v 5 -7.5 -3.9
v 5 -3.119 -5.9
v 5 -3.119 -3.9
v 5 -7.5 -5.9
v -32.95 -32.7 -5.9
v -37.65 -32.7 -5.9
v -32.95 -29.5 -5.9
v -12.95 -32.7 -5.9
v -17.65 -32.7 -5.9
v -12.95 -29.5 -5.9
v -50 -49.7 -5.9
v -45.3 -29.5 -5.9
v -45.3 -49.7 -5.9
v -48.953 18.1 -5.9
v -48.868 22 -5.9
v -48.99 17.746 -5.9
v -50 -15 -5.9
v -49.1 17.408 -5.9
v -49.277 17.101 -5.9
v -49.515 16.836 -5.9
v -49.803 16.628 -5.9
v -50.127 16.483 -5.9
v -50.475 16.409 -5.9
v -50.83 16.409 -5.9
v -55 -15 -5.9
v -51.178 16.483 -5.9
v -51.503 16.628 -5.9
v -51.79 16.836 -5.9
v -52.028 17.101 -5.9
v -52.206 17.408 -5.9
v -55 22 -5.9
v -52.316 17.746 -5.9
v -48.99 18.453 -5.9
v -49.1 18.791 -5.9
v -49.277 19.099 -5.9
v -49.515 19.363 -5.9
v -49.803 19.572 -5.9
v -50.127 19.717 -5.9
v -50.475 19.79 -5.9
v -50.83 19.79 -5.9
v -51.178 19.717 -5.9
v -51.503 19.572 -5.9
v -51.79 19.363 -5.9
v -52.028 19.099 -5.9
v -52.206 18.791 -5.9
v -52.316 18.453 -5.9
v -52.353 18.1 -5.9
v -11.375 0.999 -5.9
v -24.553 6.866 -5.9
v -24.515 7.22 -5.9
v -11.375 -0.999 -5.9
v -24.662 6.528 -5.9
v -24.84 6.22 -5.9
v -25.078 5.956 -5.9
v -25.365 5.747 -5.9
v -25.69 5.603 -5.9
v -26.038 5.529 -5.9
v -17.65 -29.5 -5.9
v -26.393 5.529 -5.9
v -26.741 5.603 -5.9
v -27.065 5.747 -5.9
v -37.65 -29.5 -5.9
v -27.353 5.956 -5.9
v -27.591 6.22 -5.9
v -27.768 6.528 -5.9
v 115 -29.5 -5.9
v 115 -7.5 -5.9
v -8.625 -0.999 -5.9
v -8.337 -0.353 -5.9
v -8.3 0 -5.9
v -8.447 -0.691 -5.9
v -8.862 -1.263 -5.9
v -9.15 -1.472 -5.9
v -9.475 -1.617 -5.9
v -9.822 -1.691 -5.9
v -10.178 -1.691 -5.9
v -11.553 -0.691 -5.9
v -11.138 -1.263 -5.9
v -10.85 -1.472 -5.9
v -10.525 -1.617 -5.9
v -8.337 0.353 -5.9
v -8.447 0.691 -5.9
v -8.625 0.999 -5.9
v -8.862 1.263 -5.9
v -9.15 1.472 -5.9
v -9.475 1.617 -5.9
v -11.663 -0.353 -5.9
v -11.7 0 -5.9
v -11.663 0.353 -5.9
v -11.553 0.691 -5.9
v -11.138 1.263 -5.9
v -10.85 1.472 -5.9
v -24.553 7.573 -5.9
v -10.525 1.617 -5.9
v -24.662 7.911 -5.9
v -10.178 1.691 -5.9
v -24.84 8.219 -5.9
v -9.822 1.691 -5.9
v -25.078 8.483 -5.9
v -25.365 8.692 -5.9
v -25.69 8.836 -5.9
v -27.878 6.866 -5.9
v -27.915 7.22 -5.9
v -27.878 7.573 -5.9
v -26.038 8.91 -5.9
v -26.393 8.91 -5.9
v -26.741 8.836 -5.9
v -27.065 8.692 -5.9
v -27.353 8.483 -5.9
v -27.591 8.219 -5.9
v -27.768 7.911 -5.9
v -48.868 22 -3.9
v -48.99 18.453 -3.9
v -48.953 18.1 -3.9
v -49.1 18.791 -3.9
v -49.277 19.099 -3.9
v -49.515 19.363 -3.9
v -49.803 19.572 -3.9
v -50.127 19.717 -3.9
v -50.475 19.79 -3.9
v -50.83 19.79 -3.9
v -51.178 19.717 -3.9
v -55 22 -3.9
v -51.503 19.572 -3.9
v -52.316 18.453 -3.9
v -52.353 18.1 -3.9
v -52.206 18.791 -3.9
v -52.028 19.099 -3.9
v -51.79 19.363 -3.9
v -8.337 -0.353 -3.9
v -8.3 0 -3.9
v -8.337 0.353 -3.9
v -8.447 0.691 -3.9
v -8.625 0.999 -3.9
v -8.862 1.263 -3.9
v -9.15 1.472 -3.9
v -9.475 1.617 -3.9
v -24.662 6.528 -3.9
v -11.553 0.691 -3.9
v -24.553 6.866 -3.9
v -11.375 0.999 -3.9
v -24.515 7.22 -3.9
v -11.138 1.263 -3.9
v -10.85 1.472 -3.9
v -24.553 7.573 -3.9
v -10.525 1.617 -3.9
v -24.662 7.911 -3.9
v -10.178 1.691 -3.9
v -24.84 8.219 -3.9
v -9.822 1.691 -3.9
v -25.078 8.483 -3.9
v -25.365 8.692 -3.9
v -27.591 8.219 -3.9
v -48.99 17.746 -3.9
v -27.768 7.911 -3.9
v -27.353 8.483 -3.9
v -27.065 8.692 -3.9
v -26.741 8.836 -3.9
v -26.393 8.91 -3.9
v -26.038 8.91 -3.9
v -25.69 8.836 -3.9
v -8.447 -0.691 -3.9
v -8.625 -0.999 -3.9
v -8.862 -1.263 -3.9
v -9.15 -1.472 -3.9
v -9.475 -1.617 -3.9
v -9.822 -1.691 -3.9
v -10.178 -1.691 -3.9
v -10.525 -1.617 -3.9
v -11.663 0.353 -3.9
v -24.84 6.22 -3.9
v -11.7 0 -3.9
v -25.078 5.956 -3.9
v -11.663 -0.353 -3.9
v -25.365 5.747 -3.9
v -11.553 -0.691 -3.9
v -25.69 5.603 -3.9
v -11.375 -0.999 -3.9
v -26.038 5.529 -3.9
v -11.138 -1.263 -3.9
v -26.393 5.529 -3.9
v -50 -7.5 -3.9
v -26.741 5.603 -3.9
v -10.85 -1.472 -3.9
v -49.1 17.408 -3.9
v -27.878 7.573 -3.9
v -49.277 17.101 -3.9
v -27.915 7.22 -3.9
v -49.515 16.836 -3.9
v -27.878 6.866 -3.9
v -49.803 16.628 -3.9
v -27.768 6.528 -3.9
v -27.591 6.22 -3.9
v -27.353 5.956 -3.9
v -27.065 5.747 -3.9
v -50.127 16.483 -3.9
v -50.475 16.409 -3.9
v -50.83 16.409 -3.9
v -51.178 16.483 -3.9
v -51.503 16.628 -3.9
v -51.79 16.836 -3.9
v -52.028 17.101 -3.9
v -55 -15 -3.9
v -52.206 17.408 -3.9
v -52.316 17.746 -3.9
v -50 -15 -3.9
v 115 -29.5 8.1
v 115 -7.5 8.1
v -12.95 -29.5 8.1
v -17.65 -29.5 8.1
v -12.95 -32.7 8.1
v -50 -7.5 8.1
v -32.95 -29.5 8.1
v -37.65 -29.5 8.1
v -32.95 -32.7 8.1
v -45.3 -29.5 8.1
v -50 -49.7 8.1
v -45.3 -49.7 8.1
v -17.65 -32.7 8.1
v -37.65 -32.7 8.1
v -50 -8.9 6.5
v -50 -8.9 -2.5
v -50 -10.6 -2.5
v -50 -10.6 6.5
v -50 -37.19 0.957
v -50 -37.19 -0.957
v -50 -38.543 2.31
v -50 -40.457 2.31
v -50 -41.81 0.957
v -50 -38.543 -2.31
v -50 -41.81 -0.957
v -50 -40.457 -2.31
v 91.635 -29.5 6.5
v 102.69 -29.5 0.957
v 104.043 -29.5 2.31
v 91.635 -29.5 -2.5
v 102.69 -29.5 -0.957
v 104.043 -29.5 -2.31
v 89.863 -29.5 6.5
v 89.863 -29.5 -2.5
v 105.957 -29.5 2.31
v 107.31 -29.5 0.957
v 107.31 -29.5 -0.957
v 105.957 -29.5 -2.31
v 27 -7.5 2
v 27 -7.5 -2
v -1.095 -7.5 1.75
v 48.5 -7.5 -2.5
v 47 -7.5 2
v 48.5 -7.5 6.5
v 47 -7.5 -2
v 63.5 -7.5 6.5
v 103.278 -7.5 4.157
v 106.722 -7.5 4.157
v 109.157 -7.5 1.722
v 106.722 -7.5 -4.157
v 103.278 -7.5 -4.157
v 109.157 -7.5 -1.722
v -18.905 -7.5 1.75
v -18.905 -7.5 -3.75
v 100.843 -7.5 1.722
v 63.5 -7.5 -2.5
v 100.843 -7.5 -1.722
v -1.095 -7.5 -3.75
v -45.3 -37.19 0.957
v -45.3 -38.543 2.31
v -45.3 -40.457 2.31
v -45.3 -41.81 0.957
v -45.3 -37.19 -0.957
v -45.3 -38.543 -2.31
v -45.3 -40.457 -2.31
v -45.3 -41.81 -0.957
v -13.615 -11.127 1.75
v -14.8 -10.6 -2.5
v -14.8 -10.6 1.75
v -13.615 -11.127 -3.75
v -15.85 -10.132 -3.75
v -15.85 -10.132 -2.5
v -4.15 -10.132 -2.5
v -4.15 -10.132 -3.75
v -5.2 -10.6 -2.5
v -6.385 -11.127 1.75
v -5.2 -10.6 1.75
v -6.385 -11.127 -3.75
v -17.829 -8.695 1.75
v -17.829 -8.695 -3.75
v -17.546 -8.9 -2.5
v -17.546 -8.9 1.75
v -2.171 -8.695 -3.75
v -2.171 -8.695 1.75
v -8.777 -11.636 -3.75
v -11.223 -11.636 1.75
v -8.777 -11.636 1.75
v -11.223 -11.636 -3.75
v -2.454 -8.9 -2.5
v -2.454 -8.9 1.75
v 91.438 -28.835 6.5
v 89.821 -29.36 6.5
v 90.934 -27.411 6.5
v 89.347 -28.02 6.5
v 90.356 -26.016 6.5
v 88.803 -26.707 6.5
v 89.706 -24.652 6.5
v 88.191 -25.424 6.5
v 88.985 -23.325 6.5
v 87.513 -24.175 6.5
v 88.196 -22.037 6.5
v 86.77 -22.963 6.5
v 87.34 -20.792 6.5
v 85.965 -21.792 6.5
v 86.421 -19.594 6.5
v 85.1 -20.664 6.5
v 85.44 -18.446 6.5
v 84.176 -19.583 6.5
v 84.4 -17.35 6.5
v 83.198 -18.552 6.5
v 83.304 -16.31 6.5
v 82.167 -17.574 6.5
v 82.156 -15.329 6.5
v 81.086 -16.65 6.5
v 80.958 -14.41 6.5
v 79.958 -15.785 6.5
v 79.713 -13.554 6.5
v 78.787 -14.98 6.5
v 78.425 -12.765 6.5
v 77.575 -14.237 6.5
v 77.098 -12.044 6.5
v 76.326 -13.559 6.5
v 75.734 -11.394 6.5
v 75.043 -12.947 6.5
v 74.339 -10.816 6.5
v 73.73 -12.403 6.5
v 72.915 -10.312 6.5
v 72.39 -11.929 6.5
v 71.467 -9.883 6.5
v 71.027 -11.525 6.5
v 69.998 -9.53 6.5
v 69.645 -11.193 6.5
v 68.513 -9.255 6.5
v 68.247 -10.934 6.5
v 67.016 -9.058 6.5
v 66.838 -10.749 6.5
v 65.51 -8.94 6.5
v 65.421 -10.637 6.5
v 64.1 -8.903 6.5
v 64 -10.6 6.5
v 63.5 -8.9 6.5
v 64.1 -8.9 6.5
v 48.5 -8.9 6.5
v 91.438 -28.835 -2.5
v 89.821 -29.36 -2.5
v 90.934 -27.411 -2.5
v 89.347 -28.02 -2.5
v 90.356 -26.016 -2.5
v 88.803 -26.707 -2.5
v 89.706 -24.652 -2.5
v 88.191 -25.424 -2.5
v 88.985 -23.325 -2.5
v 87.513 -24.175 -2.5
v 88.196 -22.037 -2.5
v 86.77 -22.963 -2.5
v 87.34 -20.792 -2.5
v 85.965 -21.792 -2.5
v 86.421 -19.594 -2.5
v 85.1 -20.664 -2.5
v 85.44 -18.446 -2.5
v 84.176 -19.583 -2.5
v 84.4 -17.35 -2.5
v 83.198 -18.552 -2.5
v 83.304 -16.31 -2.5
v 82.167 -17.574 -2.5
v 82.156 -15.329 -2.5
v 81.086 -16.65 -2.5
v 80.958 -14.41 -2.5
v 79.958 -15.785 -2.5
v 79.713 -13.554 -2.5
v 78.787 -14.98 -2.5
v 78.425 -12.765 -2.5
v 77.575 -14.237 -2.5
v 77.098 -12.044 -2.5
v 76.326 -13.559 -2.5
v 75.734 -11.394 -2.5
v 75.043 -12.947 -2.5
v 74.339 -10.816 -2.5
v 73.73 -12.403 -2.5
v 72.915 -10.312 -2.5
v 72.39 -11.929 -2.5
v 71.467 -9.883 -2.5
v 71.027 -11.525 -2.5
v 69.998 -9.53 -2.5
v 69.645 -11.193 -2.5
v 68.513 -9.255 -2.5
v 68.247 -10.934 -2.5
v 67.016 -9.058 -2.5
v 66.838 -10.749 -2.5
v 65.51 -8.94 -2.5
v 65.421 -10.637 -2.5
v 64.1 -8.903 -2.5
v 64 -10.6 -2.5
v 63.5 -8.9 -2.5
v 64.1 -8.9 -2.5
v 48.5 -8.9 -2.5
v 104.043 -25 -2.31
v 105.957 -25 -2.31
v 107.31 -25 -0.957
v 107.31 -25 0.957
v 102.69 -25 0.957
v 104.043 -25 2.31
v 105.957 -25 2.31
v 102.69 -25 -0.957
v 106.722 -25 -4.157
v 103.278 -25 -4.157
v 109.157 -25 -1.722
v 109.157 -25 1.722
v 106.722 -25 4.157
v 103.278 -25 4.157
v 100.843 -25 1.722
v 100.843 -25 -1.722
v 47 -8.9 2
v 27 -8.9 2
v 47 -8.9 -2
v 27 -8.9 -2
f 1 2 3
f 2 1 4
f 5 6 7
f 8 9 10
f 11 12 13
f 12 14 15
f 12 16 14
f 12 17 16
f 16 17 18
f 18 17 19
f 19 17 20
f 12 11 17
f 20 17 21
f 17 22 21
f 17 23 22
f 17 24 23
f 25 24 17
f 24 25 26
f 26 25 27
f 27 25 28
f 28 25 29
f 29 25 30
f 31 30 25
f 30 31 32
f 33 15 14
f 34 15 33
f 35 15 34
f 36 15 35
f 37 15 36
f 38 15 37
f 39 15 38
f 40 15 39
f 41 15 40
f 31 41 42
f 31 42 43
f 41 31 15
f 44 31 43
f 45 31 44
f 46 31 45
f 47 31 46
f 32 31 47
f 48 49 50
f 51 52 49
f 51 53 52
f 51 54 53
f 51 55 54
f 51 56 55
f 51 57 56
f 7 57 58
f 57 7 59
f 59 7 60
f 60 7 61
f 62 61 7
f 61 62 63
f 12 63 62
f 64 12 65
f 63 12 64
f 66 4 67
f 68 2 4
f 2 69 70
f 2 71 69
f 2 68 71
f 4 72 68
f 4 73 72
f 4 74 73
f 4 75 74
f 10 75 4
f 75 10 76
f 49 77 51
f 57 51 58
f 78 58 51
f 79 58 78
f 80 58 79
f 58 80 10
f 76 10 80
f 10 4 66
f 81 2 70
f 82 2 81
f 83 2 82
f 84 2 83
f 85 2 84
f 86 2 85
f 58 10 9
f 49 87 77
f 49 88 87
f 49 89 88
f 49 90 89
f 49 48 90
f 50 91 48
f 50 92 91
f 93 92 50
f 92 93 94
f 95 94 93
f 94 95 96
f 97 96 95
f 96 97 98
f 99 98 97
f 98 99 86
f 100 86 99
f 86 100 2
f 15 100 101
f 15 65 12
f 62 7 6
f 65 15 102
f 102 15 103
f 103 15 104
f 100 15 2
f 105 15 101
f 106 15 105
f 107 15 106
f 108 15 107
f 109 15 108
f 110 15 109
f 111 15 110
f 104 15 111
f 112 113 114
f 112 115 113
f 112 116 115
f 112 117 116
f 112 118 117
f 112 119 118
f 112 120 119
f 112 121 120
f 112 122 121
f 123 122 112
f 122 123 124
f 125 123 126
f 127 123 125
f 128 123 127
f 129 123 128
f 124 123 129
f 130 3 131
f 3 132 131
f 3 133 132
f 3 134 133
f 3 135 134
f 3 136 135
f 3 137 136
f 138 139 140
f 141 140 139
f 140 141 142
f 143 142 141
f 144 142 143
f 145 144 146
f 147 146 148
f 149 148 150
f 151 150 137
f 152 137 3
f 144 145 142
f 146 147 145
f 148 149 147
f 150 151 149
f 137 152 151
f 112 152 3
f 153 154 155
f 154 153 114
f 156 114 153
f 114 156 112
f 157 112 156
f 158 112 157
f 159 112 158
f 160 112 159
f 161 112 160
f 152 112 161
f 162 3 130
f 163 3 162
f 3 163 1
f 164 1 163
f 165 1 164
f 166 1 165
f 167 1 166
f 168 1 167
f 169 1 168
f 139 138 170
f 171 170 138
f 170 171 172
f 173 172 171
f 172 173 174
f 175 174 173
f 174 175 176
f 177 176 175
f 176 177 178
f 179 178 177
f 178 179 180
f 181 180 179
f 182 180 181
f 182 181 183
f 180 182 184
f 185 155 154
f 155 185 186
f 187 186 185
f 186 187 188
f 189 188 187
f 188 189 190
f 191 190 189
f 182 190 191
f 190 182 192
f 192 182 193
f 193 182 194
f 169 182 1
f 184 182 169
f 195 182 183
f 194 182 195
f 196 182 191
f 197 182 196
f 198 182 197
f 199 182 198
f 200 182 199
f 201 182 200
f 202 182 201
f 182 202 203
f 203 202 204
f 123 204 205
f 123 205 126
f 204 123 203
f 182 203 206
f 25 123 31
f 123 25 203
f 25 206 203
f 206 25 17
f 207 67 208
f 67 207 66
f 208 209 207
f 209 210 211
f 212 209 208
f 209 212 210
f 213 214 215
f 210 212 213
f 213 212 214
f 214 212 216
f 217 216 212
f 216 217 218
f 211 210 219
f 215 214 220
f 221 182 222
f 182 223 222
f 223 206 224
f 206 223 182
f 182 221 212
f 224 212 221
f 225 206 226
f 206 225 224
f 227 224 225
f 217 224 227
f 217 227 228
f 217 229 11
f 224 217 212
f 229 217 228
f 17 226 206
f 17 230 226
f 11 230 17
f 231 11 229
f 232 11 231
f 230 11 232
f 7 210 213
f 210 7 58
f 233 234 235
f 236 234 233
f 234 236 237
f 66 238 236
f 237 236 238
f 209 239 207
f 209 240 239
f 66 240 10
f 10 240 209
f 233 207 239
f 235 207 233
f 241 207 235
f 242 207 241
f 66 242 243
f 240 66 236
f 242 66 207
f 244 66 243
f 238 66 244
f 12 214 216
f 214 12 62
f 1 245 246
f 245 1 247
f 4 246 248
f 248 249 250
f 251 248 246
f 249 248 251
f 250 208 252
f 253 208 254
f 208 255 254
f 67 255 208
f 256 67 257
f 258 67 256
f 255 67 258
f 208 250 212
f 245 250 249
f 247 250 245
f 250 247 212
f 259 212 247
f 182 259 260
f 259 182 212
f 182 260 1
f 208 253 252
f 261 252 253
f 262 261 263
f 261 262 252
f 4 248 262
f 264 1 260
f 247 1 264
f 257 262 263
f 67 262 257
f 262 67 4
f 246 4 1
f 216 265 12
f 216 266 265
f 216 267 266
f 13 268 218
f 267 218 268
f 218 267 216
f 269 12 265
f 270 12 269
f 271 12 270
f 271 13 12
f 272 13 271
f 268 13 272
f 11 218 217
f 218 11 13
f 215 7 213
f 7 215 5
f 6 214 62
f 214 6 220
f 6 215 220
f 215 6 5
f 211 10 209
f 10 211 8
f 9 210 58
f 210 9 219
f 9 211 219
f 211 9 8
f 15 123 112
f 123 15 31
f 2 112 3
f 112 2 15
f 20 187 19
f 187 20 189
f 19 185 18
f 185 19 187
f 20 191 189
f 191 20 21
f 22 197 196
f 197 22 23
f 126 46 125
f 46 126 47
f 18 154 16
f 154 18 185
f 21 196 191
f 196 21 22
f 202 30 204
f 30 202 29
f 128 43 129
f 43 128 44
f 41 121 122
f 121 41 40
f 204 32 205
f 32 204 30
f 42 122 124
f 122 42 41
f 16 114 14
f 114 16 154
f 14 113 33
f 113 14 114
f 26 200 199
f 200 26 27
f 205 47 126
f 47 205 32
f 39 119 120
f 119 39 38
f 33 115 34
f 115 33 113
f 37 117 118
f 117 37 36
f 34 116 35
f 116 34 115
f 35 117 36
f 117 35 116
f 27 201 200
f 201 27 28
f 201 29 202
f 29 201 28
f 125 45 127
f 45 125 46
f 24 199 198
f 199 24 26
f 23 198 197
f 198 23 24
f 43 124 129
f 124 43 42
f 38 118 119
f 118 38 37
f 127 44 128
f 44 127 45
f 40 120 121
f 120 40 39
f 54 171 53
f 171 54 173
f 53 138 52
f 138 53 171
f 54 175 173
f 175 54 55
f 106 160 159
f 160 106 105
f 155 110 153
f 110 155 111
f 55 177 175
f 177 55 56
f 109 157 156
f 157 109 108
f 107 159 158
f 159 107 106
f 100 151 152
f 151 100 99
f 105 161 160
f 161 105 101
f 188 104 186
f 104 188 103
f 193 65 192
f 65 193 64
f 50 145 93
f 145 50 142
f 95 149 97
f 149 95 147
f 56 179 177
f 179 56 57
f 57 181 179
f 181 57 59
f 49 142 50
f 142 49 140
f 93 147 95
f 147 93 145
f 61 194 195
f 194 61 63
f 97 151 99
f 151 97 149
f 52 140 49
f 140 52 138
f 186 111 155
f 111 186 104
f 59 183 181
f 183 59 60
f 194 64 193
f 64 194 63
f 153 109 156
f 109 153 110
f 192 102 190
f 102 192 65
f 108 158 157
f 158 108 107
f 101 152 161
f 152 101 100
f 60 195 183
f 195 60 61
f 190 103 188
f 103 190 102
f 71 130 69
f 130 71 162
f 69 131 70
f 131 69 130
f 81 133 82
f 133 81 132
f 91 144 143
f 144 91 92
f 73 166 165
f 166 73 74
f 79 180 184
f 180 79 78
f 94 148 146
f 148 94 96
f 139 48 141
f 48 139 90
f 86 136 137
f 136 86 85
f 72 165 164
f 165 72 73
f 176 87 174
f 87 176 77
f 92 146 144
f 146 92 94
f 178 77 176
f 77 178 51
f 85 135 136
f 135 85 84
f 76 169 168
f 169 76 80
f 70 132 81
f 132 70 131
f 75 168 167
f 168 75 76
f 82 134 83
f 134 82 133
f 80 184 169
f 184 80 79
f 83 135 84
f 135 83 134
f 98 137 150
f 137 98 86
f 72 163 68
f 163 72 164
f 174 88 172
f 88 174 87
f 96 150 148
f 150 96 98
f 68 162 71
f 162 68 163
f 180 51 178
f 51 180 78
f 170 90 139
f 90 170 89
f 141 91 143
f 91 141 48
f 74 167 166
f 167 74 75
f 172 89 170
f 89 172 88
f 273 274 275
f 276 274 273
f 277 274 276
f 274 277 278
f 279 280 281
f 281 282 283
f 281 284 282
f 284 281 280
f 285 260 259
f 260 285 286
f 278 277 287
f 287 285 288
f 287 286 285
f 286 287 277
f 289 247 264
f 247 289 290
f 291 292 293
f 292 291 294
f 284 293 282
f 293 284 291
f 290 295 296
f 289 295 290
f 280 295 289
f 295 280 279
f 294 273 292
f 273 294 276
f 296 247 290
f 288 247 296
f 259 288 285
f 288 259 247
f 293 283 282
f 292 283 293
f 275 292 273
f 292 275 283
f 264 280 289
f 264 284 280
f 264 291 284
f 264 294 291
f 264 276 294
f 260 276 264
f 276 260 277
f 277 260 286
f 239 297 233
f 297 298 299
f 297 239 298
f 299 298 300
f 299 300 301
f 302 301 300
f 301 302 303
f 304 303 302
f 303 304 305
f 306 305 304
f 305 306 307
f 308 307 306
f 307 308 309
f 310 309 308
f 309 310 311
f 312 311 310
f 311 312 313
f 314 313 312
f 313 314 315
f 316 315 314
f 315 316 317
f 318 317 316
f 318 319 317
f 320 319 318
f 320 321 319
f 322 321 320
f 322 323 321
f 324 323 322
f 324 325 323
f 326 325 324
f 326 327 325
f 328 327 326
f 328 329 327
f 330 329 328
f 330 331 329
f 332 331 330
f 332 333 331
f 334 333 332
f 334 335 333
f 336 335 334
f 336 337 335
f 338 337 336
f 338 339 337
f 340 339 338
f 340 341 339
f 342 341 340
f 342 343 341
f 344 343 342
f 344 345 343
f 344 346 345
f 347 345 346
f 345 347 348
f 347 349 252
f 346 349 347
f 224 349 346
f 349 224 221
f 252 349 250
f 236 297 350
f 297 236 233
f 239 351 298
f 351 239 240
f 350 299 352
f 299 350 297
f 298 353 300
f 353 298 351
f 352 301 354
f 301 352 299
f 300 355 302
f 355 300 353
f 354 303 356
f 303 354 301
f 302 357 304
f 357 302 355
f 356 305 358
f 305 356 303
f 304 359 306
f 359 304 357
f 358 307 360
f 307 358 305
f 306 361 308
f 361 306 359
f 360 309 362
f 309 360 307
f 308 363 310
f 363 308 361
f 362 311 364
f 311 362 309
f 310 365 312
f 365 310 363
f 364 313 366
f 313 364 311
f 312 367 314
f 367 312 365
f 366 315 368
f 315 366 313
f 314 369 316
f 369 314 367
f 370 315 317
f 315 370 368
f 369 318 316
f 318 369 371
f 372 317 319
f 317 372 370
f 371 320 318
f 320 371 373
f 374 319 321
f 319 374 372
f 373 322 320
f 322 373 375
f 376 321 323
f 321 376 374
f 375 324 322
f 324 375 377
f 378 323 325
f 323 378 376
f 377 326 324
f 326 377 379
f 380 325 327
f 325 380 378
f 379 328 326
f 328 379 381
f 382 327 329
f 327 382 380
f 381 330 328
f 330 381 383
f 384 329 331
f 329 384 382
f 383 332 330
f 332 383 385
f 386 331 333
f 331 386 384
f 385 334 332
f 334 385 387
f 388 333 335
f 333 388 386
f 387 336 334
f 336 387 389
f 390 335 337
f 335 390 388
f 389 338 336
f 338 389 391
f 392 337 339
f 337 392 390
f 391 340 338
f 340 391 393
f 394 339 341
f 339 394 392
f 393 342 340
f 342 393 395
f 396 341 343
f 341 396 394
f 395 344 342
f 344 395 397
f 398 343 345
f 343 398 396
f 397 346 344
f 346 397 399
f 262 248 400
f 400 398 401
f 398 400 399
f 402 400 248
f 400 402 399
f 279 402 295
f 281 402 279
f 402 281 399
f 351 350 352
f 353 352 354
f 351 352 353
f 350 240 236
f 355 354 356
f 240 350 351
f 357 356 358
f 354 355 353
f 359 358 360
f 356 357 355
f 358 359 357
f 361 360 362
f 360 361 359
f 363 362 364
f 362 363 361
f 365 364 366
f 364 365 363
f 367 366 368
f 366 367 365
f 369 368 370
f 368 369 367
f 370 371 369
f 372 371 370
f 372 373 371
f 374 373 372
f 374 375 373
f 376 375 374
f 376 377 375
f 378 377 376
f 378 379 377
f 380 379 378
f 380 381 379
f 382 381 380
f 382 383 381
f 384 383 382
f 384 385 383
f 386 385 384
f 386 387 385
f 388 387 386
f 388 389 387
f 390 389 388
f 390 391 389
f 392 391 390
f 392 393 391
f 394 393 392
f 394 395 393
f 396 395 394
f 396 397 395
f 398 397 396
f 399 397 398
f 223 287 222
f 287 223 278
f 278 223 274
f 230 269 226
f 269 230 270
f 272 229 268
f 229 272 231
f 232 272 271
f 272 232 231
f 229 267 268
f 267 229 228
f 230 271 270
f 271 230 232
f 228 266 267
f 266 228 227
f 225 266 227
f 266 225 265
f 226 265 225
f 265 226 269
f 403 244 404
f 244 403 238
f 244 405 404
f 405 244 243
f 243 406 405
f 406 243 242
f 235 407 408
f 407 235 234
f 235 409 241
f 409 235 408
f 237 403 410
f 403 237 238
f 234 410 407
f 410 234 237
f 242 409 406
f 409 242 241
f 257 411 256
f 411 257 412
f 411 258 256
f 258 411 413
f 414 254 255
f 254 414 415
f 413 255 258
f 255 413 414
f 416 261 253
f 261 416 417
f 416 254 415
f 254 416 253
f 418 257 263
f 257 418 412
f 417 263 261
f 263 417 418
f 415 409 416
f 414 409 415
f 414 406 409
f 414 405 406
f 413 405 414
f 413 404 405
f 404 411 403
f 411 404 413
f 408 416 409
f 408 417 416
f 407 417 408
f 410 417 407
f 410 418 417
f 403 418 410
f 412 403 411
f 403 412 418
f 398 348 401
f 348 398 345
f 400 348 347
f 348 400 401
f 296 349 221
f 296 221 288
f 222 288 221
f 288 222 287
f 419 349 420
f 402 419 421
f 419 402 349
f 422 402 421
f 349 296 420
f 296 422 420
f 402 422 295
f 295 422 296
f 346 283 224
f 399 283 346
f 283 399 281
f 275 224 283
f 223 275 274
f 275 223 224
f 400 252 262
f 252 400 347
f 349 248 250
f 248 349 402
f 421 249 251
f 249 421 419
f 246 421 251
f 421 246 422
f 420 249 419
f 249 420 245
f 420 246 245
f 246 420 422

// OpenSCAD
PI=3.141592653589793;
*rotate([0,0,24])translate([-45+.5,0,1.25]) takeupwheel(8);
*rotate([0,0,24])translate([-18+.25,0,1.25]) frictionwheel();

d=0;
extrangle=360*-d/(19.1*PI);
*translate([0,0,0.25])rotate([0,0,12+extrangle]) sprocket();

*%translate([-140+2.1+d,19.1/2+1,2])rotate([90,0,0])mirror([0,1,0])tape(200);
rotate([180,0,0])feeder(8);

module feeder(w){
difference(){
union(){
translate([-55,-25,3.9])cube([60,40,2]);
translate([-50,7.5,-8.1])cube([165,22,14]);
%translate([95,29.5,-10])cube(20);
%translate([-45,29.5,-10])cube(20);
translate([-50,29.5,-8.1])cube([4.7,20.2,14]);
translate([-40+4.7/2,29.5,-8.1])cube([4.7,3.2,14]);
translate([-20+4.7/2,29.5,-8.1])cube([4.7,3.2,14]);

}
//mounting holes
translate([-50,39.5,0])rotate([0,90,0])rotate([0,0,360/16])cylinder(r=2.5,h=30,center=true,$fn=8);
translate([105,20,0])rotate([90,0,0])rotate([0,0,360/16])cylinder(r=2.5,h=30,center=true,$fn=8);
translate([105,10,0])rotate([90,0,0])rotate([0,0,360/16])cylinder(r=4.5,h=30,center=true,$fn=8);
translate([-10,0,0]){
translate([-60,-62,3.8])cube([70,40,3]);
translate([-30,-62,3.8])rotate([0,0,25])cube([70,40,3]);
rotate([0,0,24])translate([-45+.5,0,1.25]){
cylinder(r=1.7,h=30,$fn=30);
%takeupwheel(w);
}
rotate([0,0,24])translate([-18+.25,0,1.25]){cylinder(r=1.7,h=30,$fn=30);
%frictionwheel();
}
cylinder(r=1.7,h=30,$fn=30);
%rotate([0,0,12]) sprocket();
translate([0,0,1.])cylinder(r=23.4/2,h=5.5,center=true,$fn=30);
}
#translate([-139.9+4,19.8/2+1-.3,2.5])rotate([90,0,0])mirror([0,1,0])cube([200,9,1.7]);
#translate([56,8,-2])cube([15,3,9],true);
#translate([37,8,0])cube([20,3,4],true);
#translate([64,19.8/2+28.15-.3,-2])semicirclechannel(9,1.7,28);
#translate([49,7.3,-6])rotate([0,0,180+14.3+14])cube([98,0.1,6]);
}
}

module semicirclechannel(w,h,r){
translate([-r/2-1,0,0])difference(){
translate([r/2+1,0,0])rotate_extrude($fn=120)translate([r,0,0])square([h,w],true);
cube([r+2,2*r+h+1,w+1],true);
}
}


module tape(l=100){
	difference(){
		cube([l,8,1]);
		for(i=[0:l/4-1]){
			translate([2+i*4,1.8,-.1])cylinder(r=0.8,$fn=20,h=2);
			translate([4+i*4,5.08,0.81])cube([1.6,3.8,0.4],true);
		}
	}
}

module takeupwheel(w=8){

difference(){
union(){
translate([0,0,-2])cylinder(r=18.5,h=4.1,$fn=220);
translate([0,0,-w-1])cylinder(r=19.1,h=w+.05-1,$fn=220);
}
cylinder(r=1.9,h=20,center=true,$fn=30);
translate([0,0,0.75])rotate_extrude()translate([18.7,0,0])rotate([90,0,0])circle(r=1,$fn=50,center=true);

}
}
module frictionwheel(){
difference(){
translate([0,0,-.25])cylinder(r=15.2/2,h=2.35,$fn=220);
cylinder(r=1.9,h=10,center=true,$fn=30);
#translate([0,0,0.75])rotate_extrude()translate([8,0,0])rotate([90,0,0])circle(r=1,$fn=50,center=true);

}
}

module sprocket(){difference(){
union(){
for(i=[0:15])rotate([0,0,24*i])translate([0,-18.2/2,0])rotate([-90,0,0])cylinder(r1=0.55,r2=0.7,h=3.2,center=true,$fn=10);
cylinder(r=18.4/2,h=1.5,center=true,$fn=30);
translate([0,0,1.5])cylinder(r=18.7/2,h=3.2,center=true,$fn=30);

}
cylinder(r=1.9,h=10,center=true,$fn=30);
translate([0,0,-1.3])cylinder(r=39.0/2,h=2,center=true,$fn=30);
translate([0,0,2-.3])rotate_extrude()translate([10.2,0,0])rotate([90,0,0])circle(r=1,$fn=50,center=true);
}
}
